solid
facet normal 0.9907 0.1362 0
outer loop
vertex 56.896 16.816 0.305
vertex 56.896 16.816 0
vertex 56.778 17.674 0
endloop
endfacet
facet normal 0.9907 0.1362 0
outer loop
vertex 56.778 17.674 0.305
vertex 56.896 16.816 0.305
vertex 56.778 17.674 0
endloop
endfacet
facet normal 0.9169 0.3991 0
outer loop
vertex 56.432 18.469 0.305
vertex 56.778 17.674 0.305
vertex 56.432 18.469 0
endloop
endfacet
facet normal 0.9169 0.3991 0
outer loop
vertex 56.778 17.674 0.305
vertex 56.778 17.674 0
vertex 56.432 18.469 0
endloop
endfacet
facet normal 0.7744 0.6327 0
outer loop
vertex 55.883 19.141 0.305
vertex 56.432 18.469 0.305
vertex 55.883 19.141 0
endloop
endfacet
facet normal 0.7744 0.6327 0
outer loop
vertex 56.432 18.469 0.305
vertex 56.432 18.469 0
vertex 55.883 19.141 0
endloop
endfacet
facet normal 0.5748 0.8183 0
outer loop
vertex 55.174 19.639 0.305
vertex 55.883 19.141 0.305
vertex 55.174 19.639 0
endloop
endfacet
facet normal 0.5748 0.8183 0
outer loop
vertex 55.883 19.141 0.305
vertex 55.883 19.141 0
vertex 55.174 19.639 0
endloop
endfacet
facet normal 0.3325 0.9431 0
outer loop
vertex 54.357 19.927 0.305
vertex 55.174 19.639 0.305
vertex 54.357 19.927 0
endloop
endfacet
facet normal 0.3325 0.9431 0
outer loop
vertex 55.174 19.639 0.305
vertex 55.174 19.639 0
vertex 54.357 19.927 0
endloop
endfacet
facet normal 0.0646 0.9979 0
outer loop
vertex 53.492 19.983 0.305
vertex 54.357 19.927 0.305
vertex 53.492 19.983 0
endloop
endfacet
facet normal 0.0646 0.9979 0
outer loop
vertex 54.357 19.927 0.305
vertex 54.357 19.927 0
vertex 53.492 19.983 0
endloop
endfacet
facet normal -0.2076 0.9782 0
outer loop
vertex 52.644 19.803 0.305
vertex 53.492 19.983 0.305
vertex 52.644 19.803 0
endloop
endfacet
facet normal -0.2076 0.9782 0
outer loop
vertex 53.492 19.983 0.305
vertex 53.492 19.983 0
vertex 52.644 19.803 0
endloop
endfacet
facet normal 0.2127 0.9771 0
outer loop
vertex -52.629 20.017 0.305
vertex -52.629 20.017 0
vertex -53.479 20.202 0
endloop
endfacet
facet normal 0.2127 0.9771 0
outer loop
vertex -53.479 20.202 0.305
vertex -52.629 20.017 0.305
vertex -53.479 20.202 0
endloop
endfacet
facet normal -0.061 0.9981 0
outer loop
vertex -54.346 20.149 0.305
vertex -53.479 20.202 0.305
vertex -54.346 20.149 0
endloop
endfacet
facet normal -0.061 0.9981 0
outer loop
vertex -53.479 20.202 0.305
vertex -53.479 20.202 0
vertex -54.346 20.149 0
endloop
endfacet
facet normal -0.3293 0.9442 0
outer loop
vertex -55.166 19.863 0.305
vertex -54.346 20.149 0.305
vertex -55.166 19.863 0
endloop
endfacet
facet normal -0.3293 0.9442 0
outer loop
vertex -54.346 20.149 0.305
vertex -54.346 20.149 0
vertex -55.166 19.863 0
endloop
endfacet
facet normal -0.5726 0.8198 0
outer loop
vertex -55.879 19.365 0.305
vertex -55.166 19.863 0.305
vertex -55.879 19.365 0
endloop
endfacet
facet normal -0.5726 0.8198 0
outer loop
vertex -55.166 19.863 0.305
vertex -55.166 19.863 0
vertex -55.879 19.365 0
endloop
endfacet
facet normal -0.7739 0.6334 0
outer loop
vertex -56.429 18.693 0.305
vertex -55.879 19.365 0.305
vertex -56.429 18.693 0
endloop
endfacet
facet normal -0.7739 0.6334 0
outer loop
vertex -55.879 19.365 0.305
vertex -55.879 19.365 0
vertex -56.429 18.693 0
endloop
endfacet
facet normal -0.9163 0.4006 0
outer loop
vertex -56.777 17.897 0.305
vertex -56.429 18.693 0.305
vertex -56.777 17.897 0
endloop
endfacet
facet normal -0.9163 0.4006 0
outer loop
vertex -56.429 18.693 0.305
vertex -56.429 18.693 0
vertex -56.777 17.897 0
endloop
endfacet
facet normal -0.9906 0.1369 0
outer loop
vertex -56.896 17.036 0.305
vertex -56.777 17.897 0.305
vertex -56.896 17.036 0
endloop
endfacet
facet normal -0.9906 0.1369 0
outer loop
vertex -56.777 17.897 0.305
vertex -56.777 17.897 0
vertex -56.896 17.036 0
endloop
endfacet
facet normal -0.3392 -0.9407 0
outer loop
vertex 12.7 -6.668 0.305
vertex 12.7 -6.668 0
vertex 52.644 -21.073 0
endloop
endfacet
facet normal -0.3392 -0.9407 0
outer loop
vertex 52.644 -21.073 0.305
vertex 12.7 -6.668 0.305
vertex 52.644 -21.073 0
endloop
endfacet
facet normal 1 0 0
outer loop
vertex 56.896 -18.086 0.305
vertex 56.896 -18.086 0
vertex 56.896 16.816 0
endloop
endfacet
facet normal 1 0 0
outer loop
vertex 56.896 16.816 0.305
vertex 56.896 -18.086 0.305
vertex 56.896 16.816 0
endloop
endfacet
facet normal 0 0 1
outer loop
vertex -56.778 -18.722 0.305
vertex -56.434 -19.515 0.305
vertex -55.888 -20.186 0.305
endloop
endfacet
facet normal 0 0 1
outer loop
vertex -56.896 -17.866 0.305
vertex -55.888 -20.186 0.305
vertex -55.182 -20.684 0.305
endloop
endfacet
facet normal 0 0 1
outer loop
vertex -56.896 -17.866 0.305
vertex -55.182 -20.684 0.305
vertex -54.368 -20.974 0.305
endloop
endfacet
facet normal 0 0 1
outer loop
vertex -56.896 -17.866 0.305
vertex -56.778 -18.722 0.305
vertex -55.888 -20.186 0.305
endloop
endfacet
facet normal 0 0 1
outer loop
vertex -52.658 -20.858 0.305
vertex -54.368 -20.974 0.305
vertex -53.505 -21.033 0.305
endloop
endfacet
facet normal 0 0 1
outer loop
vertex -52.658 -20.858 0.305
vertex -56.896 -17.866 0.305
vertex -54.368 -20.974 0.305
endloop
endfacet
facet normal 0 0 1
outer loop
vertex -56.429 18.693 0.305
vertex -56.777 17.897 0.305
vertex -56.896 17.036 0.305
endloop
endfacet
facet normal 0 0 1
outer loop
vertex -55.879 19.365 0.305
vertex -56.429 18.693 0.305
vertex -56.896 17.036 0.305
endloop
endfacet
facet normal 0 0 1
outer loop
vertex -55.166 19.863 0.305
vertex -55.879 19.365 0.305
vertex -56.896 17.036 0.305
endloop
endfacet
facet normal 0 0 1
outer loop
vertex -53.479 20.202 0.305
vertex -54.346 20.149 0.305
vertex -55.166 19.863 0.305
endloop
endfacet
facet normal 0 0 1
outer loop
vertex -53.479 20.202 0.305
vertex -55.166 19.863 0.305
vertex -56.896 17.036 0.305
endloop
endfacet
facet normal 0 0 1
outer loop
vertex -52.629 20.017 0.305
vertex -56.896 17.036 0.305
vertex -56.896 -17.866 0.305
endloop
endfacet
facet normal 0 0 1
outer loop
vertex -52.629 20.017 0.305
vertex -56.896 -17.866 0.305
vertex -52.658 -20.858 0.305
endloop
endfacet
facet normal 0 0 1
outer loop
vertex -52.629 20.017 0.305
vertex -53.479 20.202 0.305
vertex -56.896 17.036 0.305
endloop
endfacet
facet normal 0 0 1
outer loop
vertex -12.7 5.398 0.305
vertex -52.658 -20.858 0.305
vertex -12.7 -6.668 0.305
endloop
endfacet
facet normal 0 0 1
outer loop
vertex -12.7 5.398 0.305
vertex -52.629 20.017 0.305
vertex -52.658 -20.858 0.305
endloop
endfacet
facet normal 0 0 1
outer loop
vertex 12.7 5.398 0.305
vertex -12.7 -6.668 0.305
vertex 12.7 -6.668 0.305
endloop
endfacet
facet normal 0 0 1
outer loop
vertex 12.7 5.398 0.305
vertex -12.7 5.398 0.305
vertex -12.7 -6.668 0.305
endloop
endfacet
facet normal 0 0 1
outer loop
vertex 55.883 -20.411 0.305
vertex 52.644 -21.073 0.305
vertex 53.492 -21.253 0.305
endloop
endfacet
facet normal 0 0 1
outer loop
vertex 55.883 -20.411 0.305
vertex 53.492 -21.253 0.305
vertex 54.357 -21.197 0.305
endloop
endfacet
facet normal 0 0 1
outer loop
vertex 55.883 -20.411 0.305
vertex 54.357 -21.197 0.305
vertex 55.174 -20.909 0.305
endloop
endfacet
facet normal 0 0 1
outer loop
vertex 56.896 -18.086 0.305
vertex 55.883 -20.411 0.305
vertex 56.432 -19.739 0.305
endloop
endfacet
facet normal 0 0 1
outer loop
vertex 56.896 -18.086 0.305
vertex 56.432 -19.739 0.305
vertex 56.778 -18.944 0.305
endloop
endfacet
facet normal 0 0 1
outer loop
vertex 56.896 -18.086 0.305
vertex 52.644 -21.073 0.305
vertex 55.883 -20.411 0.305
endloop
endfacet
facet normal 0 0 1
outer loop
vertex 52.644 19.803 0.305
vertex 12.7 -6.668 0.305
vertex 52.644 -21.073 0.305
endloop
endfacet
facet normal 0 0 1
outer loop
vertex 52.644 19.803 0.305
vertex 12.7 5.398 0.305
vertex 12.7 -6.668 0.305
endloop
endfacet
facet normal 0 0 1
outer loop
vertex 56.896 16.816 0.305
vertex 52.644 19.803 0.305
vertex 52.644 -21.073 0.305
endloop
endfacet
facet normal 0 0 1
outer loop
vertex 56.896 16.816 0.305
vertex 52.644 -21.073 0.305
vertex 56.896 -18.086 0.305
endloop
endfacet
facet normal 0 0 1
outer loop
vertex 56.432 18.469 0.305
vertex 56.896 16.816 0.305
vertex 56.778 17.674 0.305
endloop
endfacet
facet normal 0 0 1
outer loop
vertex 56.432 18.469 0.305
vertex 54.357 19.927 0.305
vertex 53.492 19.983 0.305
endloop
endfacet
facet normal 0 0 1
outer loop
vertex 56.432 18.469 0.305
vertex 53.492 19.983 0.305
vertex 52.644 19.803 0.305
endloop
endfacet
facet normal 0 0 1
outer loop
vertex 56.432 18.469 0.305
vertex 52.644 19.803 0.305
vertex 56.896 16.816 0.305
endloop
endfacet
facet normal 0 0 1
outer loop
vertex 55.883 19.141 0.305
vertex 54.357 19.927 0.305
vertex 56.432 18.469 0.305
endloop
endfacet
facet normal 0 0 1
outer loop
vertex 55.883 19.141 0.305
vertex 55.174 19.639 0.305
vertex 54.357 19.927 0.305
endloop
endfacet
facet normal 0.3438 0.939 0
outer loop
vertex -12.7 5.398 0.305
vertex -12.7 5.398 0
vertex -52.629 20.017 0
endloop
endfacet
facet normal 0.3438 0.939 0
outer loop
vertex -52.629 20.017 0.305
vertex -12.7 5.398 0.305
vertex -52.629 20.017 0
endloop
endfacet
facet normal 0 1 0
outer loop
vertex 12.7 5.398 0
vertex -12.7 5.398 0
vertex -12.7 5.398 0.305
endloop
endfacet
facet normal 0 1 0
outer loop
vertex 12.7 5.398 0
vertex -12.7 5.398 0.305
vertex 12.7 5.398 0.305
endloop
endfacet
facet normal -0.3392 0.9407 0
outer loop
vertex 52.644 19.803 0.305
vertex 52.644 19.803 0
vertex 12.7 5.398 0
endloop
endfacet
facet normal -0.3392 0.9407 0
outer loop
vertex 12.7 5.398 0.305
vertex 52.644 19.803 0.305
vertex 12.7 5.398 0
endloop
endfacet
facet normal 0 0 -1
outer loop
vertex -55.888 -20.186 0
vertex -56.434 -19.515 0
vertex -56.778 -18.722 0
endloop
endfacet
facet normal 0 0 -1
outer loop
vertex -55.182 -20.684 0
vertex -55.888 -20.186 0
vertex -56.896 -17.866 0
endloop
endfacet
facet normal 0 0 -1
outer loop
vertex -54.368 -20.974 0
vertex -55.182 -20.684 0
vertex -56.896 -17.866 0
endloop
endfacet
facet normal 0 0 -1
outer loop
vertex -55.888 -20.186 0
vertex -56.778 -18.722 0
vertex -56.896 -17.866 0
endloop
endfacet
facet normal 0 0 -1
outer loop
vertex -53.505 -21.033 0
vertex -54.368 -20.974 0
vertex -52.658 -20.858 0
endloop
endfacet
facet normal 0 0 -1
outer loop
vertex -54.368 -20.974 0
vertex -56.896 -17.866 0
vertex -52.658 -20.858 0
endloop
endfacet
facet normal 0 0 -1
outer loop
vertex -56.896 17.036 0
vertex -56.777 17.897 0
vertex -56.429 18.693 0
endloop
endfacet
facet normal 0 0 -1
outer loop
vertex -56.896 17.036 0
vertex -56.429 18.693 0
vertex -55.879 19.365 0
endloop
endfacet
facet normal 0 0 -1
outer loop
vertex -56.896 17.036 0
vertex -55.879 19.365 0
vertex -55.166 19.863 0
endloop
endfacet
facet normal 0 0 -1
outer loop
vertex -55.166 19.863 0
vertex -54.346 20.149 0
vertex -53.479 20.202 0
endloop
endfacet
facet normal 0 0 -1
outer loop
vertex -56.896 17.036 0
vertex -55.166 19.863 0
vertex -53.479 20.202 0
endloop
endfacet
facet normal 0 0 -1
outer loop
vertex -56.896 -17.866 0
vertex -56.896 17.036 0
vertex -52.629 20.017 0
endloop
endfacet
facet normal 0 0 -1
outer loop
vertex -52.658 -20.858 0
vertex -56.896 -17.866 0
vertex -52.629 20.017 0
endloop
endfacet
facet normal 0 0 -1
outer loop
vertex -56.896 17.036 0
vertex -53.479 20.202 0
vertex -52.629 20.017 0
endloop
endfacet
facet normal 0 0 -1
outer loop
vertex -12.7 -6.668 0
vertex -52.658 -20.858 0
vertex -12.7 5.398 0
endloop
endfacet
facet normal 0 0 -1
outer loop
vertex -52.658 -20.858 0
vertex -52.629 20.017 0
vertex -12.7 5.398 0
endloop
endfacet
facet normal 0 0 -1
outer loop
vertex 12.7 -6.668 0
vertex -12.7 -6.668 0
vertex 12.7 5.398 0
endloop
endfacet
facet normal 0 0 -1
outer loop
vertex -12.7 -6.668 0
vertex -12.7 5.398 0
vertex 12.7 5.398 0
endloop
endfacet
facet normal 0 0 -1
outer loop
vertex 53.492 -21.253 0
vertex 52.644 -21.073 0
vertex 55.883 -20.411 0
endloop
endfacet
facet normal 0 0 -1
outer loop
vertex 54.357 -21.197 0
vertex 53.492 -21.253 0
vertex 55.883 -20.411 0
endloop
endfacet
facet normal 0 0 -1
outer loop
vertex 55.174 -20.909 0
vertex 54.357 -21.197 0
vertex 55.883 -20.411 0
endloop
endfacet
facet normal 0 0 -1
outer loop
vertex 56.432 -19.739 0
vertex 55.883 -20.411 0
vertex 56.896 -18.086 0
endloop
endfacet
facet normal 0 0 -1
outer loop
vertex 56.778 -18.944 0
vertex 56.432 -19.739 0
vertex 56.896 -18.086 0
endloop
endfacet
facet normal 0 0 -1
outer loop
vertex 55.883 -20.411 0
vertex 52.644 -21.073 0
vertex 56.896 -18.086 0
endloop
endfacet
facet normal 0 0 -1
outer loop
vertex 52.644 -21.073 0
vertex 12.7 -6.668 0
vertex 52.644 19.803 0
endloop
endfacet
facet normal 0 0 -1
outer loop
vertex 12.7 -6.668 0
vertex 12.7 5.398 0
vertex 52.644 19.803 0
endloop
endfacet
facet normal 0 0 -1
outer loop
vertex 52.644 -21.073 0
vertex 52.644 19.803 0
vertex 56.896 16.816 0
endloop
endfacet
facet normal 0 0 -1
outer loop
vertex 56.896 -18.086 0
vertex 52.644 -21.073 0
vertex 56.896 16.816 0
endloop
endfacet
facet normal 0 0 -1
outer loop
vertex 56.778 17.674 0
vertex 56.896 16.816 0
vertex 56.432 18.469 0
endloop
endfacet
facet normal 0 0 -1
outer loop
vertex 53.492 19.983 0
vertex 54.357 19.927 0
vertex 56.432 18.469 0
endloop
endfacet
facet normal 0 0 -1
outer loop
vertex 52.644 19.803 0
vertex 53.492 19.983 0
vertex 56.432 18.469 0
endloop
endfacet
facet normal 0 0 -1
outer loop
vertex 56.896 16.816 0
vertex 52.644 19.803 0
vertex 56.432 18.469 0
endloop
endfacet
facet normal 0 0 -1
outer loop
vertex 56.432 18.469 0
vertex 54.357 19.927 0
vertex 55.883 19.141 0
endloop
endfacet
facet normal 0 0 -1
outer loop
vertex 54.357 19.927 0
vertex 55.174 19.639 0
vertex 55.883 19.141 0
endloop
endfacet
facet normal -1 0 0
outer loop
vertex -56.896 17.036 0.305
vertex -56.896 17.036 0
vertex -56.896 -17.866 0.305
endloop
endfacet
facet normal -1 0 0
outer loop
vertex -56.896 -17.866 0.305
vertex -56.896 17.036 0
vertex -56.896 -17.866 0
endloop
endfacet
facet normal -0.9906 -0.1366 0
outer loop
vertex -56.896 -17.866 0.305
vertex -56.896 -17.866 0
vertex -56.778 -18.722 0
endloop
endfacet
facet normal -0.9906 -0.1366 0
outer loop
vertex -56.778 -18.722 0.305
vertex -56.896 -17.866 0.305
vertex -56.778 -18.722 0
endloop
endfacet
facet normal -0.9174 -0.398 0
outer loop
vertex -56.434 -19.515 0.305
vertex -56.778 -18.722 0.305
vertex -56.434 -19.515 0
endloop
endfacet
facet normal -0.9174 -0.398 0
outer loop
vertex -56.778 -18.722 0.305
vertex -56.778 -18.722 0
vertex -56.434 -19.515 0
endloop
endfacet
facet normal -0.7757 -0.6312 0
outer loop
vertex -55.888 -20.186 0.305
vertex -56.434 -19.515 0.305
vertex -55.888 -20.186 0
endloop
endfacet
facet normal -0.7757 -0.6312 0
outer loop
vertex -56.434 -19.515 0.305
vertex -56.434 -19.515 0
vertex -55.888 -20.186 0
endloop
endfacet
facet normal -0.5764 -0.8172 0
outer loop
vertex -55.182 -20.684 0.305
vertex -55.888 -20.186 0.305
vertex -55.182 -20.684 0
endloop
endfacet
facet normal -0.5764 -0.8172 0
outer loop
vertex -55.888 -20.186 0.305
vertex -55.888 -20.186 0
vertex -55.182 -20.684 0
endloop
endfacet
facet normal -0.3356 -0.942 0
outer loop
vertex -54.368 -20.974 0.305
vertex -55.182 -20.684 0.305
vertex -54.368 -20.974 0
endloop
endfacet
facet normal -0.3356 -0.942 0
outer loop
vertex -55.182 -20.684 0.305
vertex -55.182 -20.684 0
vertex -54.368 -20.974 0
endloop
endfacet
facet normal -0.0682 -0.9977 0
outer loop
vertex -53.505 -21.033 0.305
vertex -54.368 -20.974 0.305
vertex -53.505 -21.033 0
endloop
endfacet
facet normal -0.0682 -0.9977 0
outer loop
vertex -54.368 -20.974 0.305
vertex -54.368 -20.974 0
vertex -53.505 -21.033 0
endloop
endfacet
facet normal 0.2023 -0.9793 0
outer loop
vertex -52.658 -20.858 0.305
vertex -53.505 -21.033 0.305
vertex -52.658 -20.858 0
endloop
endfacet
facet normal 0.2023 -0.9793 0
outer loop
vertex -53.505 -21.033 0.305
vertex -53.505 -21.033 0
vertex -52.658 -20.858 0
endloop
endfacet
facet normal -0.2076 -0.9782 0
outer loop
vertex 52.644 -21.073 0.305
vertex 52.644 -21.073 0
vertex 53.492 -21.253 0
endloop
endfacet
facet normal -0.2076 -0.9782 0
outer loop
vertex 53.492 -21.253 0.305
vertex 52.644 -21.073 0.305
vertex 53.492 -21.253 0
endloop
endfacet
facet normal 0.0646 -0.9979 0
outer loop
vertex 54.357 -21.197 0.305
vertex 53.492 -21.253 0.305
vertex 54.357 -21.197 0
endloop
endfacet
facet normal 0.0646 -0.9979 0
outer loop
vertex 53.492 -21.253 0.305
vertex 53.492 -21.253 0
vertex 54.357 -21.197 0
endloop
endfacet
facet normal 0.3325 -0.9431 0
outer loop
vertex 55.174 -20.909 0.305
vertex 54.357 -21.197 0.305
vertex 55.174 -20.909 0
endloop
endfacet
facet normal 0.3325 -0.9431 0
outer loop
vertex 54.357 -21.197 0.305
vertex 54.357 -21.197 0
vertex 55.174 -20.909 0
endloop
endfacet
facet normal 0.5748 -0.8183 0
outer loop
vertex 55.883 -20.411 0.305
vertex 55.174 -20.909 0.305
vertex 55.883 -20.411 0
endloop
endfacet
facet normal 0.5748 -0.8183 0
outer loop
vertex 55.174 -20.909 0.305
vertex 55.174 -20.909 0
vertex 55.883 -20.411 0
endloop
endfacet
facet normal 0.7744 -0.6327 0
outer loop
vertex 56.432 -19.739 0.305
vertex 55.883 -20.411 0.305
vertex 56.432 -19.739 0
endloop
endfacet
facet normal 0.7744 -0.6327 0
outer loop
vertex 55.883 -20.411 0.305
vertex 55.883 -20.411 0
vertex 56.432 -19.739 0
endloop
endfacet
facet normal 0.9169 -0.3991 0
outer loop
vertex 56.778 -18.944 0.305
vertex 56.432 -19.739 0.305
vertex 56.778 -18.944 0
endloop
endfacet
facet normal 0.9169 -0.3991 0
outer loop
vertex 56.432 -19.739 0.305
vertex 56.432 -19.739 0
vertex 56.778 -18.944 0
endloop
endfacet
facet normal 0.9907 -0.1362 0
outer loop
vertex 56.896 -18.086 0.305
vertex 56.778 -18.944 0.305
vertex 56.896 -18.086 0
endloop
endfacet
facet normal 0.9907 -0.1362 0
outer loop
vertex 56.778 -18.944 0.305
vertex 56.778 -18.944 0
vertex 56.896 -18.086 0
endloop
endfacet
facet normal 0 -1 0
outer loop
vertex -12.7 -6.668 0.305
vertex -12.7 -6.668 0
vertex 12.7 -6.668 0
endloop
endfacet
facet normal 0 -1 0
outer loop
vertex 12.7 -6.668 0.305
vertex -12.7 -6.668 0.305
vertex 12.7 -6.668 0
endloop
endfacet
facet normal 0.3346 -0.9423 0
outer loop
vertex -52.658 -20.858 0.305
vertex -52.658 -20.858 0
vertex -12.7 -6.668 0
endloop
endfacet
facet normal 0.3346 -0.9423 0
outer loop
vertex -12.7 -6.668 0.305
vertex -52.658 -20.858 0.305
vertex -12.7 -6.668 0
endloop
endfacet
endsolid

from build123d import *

# Parameters (mm, degrees)
F0_W     = 25.4
F0_H     = 12.065
F1_DEPTH = 0.3048


with BuildPart() as f1:
    # F0 (on Top) → F1 (new body)
    with BuildSketch(Plane.XY):
        with Locations((0, -0.635)):
            Rectangle(F0_W, F0_H)
        with BuildLine():
            Line((52.643894, 19.802554), (12.7, 5.3975))
            Line((12.7, 5.3975), (12.7, -6.6675))
            Line((12.7, -6.6675), (52.643894, -21.072554))
            ThreePointArc((52.643894, -21.072554), (55.54594, -20.683957), (56.896, -18.085839))
            Line((56.896, -18.085839), (56.896, -0.635))
            Line((56.896, -0.635), (56.896, 16.815839))
            ThreePointArc((56.896, 16.815839), (55.54594, 19.413957), (52.643894, 19.802554))
        make_face()
        with BuildLine():
            Line((-12.7, -6.6675), (-12.7, 5.3975))
            Line((-12.7, 5.3975), (-52.629368, 20.017363))
            ThreePointArc((-52.629368, 20.017363), (-55.539611, 19.638479), (-56.896, 17.035927))
            Line((-56.896, 17.035927), (-56.896, -0.391439))
            Line((-56.896, -0.391439), (-56.896, -17.86567))
            ThreePointArc((-56.896, -17.86567), (-55.552281, -20.459323), (-52.658498, -20.857612))
            Line((-52.658498, -20.857612), (-12.7, -6.6675))
        make_face()
    extrude(amount=F1_DEPTH)


solid = f1.part
